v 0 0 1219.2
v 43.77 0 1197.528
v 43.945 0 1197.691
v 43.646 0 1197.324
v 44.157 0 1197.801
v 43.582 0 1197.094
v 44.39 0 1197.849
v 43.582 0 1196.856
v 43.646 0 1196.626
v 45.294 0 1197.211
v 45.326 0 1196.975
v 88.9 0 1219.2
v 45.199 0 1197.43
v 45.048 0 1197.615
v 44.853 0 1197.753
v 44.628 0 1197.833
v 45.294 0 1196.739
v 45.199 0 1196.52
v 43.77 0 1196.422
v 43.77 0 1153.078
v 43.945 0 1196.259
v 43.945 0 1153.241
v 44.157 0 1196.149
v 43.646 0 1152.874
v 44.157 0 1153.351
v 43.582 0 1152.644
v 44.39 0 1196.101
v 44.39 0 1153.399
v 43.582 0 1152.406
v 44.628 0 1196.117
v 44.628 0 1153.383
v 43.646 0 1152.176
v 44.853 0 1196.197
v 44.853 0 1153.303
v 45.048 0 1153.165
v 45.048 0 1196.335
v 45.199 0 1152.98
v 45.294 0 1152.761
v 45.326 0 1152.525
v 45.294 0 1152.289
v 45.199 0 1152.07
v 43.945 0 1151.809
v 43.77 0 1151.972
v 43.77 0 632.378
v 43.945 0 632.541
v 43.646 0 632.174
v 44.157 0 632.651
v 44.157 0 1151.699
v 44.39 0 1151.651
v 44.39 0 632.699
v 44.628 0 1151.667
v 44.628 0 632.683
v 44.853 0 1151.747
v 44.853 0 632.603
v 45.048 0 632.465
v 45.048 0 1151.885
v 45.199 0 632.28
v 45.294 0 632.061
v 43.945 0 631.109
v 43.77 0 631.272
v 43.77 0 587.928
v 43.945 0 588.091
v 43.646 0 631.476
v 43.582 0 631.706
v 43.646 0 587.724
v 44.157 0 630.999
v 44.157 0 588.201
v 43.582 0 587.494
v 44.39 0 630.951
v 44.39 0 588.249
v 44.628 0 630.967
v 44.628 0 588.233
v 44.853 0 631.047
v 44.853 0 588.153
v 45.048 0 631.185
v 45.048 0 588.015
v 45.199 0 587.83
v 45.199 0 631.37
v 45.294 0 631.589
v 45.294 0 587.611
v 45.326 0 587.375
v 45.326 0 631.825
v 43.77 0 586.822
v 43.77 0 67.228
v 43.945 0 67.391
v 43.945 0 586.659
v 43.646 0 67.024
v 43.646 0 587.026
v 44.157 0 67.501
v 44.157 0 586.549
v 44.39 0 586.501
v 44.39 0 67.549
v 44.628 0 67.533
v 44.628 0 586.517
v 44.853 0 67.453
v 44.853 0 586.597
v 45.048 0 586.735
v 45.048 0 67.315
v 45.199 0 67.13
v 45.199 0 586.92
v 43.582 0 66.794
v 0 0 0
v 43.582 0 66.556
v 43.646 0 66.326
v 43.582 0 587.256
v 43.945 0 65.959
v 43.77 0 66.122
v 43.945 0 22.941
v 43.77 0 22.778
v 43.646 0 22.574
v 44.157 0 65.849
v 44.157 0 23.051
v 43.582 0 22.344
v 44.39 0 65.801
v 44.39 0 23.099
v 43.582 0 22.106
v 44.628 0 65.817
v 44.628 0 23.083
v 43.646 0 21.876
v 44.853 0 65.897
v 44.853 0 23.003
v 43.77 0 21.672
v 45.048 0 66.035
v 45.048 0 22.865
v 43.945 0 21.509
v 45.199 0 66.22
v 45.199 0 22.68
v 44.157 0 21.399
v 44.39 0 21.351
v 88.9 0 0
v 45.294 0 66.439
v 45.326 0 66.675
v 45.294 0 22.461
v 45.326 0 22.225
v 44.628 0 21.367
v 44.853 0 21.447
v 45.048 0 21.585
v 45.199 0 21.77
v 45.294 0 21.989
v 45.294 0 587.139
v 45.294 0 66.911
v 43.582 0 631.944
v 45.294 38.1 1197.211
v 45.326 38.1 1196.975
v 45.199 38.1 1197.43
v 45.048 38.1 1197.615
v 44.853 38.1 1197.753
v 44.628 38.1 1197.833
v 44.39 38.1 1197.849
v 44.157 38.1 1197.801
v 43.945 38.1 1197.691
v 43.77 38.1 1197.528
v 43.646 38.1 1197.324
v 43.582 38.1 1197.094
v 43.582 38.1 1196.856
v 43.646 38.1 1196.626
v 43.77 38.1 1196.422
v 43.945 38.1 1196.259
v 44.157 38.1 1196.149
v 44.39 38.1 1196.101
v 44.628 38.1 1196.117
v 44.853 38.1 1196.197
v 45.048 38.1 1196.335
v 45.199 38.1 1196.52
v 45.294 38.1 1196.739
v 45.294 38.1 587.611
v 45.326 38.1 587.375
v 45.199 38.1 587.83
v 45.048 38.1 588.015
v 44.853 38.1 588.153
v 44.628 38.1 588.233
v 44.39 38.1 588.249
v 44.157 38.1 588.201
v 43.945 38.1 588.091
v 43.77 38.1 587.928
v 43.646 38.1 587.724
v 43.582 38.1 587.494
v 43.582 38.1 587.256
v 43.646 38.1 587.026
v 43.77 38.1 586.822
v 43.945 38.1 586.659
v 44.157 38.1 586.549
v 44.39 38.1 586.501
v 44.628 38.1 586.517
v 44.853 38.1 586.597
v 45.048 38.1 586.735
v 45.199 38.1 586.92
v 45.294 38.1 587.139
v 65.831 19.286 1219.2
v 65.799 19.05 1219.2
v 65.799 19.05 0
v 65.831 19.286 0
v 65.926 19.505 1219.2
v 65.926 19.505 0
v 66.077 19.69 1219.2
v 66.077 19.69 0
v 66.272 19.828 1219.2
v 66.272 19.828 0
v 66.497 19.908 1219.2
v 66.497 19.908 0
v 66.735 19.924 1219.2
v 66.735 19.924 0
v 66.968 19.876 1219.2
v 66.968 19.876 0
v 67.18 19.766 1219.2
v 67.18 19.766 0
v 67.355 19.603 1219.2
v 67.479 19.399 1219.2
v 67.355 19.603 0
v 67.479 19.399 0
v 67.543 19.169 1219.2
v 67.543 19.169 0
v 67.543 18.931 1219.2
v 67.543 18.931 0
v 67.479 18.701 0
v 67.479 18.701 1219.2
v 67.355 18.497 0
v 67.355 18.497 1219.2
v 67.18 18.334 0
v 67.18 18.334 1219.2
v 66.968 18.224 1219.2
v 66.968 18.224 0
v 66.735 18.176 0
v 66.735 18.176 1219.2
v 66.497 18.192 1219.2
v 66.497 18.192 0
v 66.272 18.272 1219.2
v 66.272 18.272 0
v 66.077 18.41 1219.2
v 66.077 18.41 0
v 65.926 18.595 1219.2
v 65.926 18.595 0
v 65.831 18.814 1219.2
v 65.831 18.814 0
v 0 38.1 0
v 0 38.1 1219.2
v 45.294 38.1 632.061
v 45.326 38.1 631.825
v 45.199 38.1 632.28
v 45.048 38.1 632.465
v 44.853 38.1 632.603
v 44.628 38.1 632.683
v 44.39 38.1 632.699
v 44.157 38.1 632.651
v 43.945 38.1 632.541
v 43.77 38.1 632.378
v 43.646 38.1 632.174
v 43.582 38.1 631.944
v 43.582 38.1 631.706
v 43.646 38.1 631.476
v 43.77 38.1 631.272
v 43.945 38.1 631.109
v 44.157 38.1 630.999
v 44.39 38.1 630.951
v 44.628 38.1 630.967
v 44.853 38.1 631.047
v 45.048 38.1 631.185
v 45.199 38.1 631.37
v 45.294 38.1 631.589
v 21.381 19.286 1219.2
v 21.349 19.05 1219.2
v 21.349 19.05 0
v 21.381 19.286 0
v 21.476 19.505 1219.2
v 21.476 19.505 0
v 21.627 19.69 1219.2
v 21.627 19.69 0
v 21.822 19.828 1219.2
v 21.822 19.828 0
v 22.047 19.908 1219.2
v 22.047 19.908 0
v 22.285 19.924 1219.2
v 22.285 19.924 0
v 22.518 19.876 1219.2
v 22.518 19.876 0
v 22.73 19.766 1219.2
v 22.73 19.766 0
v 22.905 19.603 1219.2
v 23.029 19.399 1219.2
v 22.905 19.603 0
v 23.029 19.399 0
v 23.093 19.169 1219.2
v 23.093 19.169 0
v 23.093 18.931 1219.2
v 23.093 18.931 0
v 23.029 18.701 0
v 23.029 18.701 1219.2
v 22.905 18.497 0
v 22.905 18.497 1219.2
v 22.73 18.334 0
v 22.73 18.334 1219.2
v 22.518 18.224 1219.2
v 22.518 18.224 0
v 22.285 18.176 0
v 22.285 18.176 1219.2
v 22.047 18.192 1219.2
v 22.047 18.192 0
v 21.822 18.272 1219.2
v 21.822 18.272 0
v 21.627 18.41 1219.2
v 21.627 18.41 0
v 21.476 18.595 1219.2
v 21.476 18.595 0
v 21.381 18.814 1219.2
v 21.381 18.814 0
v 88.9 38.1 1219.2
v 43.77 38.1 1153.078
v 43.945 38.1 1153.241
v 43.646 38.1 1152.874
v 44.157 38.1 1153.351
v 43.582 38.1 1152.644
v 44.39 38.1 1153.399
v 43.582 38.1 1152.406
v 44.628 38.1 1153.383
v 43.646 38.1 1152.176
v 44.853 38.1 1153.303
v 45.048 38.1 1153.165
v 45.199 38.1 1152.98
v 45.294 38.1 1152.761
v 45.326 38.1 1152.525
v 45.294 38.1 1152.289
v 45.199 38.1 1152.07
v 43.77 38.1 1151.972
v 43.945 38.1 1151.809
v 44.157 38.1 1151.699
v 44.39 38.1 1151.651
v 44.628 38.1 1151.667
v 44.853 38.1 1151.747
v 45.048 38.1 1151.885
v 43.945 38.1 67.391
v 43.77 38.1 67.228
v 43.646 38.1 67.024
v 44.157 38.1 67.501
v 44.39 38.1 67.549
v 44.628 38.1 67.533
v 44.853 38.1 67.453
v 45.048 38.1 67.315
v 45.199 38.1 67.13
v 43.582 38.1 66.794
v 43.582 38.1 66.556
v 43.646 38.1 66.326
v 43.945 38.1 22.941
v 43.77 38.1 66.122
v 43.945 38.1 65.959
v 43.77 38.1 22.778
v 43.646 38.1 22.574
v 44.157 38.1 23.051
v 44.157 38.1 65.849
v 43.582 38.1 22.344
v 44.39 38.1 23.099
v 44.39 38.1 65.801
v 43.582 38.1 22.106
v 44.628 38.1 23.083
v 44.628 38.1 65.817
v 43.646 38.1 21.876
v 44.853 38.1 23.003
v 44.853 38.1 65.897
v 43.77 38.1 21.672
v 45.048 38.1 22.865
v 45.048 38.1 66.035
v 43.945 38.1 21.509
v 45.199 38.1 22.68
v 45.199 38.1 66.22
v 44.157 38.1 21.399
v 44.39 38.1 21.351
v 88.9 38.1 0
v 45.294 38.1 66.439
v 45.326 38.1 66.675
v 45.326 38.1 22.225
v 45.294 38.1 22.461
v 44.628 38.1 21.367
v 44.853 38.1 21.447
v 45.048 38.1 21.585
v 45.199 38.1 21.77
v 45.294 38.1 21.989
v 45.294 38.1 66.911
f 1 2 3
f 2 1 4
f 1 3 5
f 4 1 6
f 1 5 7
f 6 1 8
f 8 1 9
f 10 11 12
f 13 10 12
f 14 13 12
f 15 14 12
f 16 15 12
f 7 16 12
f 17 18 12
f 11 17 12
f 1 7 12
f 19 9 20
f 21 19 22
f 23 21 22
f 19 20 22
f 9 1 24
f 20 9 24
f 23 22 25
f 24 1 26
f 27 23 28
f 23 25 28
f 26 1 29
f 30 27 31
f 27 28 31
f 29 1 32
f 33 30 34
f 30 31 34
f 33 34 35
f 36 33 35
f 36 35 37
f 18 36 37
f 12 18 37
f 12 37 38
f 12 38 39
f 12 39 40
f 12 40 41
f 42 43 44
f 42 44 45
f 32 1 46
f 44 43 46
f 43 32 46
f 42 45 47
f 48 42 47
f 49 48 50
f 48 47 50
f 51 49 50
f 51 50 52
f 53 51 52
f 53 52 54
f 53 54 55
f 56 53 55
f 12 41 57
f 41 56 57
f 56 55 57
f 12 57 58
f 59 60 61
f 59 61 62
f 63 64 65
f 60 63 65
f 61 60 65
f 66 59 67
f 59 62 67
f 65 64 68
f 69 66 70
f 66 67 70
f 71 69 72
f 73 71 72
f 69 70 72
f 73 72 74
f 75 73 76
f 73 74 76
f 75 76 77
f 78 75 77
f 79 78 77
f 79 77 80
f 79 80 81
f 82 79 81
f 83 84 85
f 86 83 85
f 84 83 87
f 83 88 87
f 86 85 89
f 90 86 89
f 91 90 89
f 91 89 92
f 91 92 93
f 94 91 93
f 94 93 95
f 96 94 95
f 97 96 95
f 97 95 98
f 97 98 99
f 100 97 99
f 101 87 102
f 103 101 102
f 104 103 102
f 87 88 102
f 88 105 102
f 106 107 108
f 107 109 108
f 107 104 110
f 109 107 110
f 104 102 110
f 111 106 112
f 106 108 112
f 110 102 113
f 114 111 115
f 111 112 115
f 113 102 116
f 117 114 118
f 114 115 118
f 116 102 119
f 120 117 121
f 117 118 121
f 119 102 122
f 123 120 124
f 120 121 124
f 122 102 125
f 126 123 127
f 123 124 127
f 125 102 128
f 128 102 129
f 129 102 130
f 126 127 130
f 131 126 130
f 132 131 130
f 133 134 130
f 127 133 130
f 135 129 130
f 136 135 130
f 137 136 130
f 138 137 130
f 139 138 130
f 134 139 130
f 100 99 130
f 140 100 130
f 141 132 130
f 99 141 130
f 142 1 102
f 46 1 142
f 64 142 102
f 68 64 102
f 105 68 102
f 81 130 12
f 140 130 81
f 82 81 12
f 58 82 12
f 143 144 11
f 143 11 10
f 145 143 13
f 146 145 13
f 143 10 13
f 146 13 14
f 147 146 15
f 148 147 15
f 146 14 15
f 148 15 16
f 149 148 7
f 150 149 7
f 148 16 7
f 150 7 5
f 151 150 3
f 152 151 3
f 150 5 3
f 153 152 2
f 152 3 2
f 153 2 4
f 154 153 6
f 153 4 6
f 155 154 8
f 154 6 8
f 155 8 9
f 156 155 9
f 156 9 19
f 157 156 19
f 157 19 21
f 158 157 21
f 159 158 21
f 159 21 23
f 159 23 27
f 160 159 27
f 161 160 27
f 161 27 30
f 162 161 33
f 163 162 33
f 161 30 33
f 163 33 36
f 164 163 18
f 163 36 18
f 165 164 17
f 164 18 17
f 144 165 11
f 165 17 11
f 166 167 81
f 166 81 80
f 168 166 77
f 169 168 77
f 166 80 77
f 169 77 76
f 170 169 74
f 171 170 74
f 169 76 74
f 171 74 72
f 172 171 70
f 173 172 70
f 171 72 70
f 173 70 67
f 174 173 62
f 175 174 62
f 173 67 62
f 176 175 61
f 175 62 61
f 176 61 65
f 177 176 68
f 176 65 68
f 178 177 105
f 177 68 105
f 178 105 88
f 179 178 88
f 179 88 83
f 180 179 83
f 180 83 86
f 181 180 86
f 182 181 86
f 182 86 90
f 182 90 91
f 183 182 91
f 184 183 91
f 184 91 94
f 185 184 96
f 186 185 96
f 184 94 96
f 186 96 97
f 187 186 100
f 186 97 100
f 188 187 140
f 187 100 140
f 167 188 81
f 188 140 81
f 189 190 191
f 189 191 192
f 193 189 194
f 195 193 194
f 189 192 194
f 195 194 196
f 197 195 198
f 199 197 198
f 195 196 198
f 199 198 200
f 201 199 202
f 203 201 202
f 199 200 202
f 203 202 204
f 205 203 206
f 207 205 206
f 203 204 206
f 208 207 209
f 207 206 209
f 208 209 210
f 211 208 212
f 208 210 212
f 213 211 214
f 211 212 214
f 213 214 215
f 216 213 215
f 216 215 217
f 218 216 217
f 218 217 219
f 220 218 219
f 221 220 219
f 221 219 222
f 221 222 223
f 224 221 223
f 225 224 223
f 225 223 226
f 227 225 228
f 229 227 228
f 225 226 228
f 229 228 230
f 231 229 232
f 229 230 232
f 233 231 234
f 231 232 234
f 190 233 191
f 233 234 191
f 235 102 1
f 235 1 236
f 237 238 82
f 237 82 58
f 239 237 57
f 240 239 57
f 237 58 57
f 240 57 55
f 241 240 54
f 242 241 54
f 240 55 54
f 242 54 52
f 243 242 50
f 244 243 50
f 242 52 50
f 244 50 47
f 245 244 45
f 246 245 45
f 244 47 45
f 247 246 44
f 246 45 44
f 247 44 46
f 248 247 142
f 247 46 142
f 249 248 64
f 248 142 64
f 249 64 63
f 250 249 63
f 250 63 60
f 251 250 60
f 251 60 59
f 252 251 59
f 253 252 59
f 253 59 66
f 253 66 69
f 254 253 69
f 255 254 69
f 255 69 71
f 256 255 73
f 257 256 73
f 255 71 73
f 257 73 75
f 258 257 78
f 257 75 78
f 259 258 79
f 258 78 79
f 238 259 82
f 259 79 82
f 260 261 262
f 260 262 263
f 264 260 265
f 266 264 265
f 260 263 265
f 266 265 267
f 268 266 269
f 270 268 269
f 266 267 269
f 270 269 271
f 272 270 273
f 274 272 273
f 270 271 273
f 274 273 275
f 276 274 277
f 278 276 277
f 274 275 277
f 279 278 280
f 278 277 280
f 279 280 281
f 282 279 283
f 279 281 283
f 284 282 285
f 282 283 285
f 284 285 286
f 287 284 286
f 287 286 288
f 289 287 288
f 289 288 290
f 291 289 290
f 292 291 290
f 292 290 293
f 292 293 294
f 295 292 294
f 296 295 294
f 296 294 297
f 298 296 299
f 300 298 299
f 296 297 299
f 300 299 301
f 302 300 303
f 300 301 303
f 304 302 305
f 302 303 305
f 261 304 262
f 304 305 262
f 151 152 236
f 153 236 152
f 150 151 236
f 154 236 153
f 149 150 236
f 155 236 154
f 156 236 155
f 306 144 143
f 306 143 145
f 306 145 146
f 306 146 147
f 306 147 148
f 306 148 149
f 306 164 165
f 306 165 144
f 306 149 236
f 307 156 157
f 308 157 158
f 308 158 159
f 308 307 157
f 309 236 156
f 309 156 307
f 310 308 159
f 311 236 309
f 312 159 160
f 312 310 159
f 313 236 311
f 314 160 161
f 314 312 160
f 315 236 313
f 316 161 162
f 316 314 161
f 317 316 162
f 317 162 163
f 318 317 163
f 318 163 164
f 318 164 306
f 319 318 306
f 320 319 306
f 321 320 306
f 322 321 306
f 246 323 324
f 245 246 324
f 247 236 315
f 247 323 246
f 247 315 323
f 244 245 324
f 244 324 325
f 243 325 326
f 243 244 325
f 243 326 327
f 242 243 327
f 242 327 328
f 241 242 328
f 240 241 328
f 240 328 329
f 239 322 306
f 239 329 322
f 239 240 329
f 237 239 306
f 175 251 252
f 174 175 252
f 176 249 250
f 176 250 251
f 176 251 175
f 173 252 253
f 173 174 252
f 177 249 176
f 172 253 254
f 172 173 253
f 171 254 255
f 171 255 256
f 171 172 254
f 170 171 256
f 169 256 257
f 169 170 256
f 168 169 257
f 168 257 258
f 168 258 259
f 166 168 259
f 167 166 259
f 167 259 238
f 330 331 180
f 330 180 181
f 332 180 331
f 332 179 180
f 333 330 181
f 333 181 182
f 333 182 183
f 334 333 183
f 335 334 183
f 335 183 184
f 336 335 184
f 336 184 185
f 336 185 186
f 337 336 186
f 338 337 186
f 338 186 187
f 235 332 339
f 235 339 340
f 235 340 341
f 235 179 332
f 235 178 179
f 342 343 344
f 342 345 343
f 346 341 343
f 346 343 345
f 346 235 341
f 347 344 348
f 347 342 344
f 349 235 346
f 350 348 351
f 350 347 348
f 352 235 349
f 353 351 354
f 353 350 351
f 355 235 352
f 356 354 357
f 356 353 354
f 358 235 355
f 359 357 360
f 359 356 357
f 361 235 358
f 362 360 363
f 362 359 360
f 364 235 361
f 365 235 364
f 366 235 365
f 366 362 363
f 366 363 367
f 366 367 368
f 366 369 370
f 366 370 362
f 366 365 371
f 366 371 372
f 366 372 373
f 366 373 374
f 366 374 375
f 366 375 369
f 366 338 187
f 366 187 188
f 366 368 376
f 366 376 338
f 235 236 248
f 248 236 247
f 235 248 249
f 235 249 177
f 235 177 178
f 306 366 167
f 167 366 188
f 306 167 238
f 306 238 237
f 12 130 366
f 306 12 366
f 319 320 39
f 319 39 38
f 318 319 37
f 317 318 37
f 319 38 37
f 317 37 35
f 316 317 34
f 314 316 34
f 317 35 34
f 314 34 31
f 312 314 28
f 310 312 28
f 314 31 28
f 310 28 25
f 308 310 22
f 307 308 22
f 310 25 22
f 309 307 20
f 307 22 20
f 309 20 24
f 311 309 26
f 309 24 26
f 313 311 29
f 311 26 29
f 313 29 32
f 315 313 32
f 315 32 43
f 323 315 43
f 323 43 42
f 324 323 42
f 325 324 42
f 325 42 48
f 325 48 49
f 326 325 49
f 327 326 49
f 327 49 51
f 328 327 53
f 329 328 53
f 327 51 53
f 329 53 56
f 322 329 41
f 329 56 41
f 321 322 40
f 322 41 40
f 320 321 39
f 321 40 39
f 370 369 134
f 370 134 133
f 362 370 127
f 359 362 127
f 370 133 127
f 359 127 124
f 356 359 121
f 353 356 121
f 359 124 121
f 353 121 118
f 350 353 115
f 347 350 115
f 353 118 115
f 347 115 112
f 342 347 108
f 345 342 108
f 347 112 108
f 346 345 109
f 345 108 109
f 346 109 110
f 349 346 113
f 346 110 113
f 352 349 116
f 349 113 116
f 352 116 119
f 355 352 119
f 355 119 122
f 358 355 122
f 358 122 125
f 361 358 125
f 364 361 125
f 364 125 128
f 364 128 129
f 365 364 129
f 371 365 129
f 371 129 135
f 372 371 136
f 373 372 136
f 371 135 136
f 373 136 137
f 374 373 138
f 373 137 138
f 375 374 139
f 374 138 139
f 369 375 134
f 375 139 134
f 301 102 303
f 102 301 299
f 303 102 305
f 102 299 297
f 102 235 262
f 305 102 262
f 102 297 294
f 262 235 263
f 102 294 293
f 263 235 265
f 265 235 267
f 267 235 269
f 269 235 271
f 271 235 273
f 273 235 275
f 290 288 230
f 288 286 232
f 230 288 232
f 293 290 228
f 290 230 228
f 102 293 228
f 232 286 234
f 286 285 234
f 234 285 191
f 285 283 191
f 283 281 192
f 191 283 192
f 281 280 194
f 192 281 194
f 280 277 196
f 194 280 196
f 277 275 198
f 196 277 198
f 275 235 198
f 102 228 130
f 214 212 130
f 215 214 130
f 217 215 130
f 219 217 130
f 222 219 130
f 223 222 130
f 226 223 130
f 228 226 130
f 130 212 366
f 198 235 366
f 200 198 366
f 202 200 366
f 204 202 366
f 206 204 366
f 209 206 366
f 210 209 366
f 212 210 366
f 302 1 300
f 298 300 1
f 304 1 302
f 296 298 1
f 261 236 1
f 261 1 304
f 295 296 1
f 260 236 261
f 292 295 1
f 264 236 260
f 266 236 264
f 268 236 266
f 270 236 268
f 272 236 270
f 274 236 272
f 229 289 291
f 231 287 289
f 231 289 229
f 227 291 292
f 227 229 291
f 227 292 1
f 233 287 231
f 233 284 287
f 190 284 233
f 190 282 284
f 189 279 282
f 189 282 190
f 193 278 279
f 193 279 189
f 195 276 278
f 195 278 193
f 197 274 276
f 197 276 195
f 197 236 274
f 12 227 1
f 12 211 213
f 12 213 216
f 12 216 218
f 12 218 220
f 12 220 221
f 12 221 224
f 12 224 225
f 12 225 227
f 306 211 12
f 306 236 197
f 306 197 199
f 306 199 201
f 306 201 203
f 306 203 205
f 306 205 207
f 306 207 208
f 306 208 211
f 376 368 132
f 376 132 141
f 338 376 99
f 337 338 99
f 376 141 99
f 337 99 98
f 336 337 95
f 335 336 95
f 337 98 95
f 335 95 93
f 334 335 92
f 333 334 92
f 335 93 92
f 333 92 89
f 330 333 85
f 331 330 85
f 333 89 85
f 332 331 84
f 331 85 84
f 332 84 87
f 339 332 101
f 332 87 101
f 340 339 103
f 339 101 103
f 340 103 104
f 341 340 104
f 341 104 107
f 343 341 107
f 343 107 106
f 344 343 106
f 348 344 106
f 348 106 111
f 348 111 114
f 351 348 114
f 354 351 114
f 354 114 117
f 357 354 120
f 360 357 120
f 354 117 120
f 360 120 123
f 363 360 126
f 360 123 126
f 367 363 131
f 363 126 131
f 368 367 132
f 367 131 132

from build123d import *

# Parameters (mm, degrees)
SKETCH1_W           = 88.9
SKETCH1_H           = 38.1
BOSS_EXTRUDE1_DEPTH = 1219.2
SKETCH2_R           = 0.8763
CUT_EXTRUDE1_DEPTH  = 1219.2
SKETCH3_R           = 0.8763
CUT_EXTRUDE2_DEPTH  = 38.1


with BuildPart() as part:
    # Sketch1 → Boss-Extrude1 (new body)
    with BuildSketch(Plane.XY):
        with Locations((44.45, 19.05)):
            Rectangle(SKETCH1_W, SKETCH1_H)
    extrude(amount=BOSS_EXTRUDE1_DEPTH)

    # Sketch2 → Cut-Extrude1 (cut)
    with BuildSketch(Plane(origin=(0, 0, 0), x_dir=(-1, 0, 0), z_dir=(0, 0, -1))):
        with Locations((-66.675, 19.05)):
            Circle(SKETCH2_R)
        with Locations((-22.225, 19.05)):
            Circle(SKETCH2_R)
    extrude(amount=-CUT_EXTRUDE1_DEPTH, mode=Mode.SUBTRACT)

    # Sketch3 → Cut-Extrude2 (cut)
    with BuildSketch(Plane.XZ):
        with Locations((44.45, 1196.975)):
            Circle(SKETCH3_R)
        with Locations((44.45, 1152.525)):
            Circle(SKETCH3_R)
        with Locations((44.45, 22.225)):
            Circle(SKETCH3_R)
        with Locations((44.45, 66.675)):
            Circle(SKETCH3_R)
        with Locations((44.45, 587.375)):
            Circle(SKETCH3_R)
        with Locations((44.45, 631.825)):
            Circle(SKETCH3_R)
    extrude(amount=-CUT_EXTRUDE2_DEPTH, mode=Mode.SUBTRACT)


solid = part.part
